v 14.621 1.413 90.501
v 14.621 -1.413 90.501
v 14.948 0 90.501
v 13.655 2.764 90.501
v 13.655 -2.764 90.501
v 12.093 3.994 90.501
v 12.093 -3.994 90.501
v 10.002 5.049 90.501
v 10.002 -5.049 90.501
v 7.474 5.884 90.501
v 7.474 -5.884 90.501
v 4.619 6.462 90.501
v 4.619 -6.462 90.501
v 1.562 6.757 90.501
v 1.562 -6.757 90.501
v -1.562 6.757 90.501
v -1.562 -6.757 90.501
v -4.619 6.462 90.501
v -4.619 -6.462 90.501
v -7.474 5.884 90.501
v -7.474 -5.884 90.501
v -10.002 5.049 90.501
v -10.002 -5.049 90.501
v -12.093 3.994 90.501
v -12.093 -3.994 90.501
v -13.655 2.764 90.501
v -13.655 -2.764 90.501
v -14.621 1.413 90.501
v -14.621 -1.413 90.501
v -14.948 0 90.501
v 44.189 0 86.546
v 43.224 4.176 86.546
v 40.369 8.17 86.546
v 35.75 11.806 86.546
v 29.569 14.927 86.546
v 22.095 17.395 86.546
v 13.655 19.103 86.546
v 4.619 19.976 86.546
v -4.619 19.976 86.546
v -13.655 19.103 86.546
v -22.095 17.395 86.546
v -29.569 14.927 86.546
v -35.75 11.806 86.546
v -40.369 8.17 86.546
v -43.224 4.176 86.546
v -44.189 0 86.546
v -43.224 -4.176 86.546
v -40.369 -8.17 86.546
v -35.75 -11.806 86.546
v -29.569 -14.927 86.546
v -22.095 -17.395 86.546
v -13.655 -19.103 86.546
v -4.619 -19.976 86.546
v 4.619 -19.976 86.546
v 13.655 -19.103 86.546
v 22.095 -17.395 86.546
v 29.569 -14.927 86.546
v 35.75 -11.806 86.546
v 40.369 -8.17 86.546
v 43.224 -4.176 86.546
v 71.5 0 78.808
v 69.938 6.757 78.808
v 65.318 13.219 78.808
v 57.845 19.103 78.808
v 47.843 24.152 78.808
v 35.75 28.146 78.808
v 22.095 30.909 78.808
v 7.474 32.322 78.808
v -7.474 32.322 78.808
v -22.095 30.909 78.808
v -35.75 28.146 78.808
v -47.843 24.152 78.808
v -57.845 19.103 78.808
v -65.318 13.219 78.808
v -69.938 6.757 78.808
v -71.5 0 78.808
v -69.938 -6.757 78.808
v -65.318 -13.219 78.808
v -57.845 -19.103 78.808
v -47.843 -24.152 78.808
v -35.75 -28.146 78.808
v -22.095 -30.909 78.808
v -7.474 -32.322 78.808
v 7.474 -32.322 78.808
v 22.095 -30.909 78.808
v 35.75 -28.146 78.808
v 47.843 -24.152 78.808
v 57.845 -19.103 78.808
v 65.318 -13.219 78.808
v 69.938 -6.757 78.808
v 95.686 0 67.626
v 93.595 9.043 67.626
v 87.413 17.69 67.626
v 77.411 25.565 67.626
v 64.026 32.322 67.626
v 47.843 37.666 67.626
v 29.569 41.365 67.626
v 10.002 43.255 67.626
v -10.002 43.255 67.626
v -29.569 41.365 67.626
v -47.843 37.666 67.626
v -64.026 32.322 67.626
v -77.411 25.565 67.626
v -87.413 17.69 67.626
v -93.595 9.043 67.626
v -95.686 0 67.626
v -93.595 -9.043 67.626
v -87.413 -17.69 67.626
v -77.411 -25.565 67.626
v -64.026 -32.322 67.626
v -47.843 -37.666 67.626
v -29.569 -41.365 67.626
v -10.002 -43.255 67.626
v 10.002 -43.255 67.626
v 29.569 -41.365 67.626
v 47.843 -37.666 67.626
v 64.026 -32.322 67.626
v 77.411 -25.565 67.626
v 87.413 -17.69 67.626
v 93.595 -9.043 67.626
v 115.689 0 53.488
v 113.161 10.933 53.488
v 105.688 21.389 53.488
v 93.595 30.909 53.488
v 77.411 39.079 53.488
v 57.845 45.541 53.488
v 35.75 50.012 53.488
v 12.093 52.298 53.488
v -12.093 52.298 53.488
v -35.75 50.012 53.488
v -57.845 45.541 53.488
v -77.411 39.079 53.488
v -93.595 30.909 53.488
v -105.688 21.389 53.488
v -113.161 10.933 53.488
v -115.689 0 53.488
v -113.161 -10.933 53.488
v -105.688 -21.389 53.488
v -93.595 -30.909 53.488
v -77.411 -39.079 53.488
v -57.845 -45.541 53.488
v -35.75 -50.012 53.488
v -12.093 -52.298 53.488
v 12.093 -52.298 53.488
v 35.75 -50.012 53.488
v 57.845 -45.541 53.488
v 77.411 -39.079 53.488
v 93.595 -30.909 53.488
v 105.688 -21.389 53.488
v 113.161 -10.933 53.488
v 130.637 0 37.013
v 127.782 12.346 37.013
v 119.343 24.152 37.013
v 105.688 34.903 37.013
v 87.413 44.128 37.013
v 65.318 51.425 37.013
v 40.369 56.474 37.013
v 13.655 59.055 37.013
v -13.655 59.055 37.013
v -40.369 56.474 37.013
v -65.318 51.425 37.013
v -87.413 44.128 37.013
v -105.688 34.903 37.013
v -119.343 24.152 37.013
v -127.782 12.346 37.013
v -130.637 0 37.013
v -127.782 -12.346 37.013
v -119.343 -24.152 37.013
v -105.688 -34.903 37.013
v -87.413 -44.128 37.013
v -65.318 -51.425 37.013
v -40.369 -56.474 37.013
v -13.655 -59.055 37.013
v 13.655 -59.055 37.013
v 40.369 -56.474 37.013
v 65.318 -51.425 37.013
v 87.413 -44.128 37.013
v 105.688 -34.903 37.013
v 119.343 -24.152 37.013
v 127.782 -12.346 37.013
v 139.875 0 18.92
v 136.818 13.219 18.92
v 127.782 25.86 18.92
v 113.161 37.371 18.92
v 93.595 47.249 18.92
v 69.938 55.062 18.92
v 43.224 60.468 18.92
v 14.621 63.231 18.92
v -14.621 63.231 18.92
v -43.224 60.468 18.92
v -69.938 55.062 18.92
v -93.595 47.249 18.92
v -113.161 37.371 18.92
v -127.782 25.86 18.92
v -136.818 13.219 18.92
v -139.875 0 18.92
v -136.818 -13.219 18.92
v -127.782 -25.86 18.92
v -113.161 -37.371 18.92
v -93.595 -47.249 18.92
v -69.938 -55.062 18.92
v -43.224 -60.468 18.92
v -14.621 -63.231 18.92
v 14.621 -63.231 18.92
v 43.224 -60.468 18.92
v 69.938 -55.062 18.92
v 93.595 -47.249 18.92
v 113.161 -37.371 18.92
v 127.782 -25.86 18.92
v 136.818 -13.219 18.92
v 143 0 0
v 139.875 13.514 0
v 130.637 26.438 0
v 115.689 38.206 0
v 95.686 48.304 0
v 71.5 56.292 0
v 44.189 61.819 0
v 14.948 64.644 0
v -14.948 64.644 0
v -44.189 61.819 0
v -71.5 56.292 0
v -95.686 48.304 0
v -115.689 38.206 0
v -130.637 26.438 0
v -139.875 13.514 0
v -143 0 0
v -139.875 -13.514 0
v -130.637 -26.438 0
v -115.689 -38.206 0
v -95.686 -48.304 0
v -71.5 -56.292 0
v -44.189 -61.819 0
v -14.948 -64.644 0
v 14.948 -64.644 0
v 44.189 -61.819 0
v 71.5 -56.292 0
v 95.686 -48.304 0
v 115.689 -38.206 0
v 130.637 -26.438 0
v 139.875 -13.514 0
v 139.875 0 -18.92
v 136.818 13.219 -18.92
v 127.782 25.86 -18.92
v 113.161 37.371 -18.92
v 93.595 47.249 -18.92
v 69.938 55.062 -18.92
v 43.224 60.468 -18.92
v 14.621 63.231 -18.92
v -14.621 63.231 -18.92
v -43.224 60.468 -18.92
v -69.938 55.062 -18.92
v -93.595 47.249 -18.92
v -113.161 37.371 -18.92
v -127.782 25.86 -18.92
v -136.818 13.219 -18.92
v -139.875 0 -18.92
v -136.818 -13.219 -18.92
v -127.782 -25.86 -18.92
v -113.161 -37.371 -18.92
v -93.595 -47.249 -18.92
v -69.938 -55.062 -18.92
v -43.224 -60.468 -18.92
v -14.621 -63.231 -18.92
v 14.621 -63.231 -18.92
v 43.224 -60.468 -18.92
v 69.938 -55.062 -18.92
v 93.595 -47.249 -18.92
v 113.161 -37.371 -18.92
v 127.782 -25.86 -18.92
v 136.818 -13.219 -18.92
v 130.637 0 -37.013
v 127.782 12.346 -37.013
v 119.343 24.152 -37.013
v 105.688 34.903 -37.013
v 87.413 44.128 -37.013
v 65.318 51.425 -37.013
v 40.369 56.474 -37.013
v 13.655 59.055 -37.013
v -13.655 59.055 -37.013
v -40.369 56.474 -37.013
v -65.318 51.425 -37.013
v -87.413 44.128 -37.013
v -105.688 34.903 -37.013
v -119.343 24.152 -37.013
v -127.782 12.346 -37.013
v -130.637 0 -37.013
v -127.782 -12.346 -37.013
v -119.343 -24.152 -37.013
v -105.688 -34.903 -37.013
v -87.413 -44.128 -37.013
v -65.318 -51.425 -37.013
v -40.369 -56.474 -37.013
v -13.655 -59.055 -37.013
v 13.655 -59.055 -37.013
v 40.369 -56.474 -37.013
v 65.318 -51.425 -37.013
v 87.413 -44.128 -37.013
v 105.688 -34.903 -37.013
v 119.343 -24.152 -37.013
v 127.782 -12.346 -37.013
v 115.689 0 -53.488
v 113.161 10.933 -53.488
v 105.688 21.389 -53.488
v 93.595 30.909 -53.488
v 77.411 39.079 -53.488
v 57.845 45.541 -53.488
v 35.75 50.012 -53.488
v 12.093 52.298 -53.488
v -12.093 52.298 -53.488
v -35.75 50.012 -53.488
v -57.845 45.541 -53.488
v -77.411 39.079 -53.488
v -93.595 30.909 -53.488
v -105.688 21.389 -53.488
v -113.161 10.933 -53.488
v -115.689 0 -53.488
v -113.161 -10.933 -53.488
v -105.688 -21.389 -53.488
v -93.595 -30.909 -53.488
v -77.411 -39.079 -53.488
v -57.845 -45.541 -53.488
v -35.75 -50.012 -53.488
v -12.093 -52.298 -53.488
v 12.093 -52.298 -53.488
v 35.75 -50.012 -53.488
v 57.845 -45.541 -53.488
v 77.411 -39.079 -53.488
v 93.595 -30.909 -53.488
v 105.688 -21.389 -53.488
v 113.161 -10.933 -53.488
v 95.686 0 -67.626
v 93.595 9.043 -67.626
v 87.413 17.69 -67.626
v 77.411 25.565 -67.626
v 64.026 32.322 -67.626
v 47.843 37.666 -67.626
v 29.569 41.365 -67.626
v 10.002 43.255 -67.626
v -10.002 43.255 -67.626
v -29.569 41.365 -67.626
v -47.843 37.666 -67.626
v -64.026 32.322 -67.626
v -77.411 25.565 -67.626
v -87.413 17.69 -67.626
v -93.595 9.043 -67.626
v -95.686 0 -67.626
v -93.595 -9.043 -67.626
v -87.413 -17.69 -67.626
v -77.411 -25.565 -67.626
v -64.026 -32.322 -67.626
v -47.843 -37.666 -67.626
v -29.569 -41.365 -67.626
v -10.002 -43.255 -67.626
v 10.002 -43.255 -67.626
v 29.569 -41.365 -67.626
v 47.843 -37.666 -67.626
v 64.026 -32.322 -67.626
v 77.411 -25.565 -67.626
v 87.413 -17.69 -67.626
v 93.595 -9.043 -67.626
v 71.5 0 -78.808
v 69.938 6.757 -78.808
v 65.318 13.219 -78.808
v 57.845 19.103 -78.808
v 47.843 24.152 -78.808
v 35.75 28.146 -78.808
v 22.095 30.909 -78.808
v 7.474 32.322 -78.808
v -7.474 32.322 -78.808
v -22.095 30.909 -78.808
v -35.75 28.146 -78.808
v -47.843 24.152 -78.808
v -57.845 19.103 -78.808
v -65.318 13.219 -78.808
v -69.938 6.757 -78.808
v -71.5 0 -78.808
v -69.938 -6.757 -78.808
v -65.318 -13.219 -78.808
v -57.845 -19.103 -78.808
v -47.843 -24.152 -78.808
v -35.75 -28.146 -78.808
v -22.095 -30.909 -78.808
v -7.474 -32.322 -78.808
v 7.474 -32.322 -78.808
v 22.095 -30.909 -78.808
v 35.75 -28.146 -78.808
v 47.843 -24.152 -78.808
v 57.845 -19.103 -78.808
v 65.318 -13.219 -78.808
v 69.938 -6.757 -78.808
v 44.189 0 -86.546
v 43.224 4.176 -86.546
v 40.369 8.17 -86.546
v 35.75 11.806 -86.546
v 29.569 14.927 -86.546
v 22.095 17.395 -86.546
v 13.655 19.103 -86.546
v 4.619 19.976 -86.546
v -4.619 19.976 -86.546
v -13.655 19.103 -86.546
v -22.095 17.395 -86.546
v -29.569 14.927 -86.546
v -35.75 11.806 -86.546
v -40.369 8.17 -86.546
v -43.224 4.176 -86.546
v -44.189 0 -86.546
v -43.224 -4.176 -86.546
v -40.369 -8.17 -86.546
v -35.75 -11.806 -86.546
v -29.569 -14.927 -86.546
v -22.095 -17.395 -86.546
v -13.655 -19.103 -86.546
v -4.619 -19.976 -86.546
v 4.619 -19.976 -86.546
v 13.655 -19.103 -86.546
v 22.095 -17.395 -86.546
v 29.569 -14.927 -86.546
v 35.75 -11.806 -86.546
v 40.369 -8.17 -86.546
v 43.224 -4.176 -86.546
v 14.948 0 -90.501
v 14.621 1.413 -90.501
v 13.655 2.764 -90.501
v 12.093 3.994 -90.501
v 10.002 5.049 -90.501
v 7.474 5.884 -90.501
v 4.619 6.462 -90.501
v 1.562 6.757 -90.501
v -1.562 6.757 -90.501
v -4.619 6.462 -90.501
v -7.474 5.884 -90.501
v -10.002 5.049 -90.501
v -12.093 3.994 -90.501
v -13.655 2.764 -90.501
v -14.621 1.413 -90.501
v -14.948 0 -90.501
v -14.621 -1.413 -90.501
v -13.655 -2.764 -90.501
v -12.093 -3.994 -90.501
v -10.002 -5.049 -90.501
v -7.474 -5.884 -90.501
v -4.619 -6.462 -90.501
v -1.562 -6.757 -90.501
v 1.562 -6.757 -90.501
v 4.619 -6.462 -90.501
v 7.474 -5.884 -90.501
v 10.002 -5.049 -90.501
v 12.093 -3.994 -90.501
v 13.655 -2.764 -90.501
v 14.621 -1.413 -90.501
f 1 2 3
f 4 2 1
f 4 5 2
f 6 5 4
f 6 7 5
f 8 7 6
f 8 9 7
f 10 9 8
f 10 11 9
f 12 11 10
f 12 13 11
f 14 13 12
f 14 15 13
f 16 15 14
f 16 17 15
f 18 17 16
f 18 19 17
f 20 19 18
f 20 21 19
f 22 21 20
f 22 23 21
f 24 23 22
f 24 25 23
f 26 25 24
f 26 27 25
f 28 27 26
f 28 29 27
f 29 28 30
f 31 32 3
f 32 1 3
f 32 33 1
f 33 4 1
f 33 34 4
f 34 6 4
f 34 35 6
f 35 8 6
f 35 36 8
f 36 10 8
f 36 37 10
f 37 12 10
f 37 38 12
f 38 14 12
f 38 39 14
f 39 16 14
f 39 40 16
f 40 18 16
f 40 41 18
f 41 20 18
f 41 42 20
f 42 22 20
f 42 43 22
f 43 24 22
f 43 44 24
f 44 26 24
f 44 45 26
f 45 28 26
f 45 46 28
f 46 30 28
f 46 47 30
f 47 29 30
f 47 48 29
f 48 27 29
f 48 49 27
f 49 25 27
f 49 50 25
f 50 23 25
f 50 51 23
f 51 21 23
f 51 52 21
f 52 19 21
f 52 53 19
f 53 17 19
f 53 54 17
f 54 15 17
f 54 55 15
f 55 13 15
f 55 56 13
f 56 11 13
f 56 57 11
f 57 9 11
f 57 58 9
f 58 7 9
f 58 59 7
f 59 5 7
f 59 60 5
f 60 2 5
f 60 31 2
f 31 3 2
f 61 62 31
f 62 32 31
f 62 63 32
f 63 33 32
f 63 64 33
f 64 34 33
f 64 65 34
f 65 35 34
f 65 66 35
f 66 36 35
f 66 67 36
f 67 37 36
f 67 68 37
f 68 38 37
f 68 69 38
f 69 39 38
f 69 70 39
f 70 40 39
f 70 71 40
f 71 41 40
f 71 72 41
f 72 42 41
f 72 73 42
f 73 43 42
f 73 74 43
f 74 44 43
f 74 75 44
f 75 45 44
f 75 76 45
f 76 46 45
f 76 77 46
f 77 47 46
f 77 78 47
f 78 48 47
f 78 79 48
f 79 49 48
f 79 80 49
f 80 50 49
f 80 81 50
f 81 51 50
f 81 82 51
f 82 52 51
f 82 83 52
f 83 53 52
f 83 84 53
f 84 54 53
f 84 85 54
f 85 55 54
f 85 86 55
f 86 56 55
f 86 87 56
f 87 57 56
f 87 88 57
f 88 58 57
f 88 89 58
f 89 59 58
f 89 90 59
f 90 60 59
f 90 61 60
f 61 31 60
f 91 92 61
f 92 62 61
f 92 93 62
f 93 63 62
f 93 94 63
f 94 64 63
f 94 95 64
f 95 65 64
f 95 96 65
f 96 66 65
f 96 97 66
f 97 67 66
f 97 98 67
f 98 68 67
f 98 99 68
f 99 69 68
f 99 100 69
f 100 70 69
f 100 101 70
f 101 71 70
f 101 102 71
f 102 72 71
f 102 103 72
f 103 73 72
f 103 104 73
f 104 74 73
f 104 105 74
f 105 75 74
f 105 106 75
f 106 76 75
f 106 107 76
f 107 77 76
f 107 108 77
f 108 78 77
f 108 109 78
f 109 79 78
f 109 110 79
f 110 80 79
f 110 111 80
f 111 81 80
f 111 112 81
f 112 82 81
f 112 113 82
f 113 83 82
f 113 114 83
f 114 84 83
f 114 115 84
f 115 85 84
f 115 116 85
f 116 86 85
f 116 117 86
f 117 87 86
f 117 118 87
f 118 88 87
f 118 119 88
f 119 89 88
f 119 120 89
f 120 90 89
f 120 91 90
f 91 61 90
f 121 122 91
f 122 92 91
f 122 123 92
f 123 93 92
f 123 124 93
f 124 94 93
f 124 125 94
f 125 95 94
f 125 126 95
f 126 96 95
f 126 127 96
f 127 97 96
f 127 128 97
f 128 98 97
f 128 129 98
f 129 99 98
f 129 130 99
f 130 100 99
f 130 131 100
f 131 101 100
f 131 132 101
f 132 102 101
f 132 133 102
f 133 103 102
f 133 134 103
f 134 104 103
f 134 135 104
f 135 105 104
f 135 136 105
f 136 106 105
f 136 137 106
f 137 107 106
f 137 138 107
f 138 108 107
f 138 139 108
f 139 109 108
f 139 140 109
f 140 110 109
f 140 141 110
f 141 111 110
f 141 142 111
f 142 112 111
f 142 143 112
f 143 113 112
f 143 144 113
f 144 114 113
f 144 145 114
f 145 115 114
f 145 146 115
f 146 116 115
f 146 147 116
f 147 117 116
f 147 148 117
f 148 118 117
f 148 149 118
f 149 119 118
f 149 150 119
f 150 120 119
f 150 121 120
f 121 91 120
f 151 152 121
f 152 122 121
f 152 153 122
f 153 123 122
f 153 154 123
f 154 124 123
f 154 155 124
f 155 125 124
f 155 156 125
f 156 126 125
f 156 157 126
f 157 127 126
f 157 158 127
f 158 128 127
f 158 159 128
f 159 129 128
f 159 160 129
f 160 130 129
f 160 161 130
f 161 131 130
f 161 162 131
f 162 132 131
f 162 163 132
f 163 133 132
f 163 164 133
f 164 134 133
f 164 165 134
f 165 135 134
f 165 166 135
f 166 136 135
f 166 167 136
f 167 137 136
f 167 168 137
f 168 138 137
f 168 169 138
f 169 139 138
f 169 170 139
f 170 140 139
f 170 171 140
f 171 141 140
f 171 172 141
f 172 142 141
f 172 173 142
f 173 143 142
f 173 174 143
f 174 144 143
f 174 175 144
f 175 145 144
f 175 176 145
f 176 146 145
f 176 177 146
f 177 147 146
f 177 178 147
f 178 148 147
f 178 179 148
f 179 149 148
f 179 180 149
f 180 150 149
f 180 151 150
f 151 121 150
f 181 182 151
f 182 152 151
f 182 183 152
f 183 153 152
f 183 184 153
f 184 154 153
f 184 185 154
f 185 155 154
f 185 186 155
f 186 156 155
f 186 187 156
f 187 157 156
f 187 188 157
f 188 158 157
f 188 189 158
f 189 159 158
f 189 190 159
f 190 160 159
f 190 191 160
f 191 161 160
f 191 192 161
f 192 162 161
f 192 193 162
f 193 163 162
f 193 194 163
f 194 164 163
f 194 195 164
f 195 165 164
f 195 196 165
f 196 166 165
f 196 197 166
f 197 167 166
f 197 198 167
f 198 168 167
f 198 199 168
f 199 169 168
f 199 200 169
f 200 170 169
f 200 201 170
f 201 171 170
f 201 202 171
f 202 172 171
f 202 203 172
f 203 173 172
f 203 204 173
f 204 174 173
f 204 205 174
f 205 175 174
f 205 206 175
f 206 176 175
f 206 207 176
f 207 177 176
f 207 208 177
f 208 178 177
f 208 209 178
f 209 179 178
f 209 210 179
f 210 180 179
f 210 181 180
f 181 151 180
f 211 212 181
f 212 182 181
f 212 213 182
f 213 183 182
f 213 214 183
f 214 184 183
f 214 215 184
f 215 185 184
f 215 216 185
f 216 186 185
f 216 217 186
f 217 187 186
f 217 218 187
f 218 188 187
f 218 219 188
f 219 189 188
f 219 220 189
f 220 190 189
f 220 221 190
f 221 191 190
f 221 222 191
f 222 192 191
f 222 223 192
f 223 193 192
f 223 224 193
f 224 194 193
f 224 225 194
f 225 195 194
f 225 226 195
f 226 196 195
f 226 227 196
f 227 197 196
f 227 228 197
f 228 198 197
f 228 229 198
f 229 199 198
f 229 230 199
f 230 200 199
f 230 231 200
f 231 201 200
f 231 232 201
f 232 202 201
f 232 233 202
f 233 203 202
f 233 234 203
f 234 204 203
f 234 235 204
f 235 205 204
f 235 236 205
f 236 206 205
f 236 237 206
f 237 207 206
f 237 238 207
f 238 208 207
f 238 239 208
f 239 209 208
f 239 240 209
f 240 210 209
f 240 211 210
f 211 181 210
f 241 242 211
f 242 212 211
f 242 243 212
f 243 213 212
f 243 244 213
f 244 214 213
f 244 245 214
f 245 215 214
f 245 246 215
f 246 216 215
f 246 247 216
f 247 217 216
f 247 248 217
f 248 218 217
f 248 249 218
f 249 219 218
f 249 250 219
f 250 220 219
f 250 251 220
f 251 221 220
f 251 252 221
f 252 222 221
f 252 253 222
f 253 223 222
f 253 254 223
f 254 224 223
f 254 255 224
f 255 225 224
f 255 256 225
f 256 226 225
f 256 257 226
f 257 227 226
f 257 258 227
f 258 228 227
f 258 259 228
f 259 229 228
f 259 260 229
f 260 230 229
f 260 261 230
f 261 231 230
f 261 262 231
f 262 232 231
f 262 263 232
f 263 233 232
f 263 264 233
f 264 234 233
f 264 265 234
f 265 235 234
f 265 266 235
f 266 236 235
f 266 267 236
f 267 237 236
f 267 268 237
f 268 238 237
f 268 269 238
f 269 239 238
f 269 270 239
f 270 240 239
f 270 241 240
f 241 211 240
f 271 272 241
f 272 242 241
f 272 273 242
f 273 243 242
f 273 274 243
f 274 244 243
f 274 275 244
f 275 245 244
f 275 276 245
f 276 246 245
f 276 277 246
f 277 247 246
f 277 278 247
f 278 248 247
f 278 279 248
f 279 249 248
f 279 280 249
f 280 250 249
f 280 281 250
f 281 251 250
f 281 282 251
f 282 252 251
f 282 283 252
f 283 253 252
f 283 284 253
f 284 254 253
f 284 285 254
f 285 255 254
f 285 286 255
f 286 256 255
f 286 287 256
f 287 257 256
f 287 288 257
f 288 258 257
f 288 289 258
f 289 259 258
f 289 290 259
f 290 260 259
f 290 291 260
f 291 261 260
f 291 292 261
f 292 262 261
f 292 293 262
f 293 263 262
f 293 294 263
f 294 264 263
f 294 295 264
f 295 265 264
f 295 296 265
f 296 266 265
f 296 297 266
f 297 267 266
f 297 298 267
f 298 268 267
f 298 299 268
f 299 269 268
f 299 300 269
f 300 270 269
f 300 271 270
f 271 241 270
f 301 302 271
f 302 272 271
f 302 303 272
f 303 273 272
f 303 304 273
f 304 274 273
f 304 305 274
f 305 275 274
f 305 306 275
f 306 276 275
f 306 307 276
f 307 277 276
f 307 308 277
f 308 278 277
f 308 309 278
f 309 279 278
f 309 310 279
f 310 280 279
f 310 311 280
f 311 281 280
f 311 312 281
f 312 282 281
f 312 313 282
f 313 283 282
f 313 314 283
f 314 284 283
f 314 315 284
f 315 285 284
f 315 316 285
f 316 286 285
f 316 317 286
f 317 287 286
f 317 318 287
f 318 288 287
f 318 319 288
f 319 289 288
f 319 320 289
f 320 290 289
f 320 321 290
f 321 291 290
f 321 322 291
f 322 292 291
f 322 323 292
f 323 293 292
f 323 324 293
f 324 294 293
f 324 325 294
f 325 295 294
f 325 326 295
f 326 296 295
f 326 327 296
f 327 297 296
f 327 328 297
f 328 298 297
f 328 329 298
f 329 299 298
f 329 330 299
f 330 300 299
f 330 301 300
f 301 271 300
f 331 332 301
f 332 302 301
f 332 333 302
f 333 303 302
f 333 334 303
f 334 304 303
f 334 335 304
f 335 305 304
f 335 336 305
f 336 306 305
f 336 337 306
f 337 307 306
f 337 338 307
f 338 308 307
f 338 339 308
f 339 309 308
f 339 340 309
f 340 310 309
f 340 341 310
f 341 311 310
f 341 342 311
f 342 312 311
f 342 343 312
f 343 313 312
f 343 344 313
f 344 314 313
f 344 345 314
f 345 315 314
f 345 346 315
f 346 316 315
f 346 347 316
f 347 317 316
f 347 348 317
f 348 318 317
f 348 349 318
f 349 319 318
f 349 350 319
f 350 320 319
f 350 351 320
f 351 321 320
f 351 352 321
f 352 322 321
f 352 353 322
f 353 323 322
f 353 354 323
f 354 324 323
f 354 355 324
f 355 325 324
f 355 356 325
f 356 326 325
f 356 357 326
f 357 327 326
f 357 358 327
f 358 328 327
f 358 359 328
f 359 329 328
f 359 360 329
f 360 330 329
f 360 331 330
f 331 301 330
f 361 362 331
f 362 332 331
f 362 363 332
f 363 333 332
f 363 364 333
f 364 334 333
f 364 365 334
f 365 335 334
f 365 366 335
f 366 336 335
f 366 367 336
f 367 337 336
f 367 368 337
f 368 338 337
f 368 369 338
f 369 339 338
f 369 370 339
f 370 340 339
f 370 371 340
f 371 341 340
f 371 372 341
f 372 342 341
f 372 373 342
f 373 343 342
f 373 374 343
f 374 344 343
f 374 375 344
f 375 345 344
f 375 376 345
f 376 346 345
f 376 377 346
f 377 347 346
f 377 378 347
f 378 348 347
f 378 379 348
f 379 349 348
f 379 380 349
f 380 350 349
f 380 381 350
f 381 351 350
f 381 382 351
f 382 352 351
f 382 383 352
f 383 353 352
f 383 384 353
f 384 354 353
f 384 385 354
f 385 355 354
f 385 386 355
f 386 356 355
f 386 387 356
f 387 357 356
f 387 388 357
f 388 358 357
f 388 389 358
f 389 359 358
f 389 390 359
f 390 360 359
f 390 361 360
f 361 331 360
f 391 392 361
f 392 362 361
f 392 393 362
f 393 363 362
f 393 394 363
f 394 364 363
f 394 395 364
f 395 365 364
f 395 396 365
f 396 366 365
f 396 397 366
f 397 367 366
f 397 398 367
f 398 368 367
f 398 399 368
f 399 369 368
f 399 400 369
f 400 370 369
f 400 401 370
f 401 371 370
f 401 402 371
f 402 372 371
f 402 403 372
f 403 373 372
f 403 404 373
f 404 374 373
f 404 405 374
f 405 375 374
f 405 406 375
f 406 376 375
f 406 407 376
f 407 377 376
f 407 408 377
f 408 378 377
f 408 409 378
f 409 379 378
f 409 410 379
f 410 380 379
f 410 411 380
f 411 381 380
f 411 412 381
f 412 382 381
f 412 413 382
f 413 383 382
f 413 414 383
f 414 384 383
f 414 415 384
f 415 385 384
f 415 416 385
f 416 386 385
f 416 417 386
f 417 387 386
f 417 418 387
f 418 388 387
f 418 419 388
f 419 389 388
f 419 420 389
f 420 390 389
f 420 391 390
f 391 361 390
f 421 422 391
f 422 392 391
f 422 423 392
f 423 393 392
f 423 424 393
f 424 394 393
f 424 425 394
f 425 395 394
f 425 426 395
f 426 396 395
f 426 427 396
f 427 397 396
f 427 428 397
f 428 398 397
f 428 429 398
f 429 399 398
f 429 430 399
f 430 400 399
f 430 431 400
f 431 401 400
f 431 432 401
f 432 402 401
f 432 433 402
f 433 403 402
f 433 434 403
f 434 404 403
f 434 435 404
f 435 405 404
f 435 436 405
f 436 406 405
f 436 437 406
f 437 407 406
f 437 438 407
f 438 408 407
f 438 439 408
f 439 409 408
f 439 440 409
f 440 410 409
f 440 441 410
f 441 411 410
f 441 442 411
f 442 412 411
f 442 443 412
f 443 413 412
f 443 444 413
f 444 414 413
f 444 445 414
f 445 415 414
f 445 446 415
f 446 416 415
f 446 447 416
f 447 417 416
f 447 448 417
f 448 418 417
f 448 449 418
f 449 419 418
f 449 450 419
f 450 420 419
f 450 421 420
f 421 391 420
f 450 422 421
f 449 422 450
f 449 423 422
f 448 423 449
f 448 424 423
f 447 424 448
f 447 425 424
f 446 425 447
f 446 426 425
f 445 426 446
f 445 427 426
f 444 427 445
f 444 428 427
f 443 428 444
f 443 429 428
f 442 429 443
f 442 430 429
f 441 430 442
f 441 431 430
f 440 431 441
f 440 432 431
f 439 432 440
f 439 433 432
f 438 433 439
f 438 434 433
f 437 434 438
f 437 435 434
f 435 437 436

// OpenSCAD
// Generated by SolidPython 1.0.1 on 2020-07-29 00:46:49


scale(v = [11, 5, 7]) {
	sphere(r = 13);
}
/***********************************************
*********      SolidPython code:      **********
************************************************
 
# import packages: SolidPython
from solid import *
from solid.utils import *
from itertools import chain, combinations, permutations


class Resize:

    def __init__(self, scad_file):
        self.scad_file = scad_file
        #self.scad_file = import_scad(scad_file)
        # cone/cylinder param:
        self.r1 = 0
        self.r2 = 0
        self.h = 0
        # rectangular prism param:
        self.w = 0
        self.l = 0
        # ellipse param:
        self.r = 0

    # import OpenScad code (file name corresponds to shape)


    # classify shape + parameters
    def assign(self, param1, param2, param3):
        if self.scad_file == 'cone.scad':
            self.r1 = param1
            self.r2 = param2
            self.h = param3
        elif self.scad_file == 'cylinder.scad':
            self.r1 = param1
            self.r2 = param2
            self.h = param3
        elif self.scad_file == 'rectangularPrism.scad':
            self.h = param1
            self.l = param2
            self.w = param3
        else:
            self.r = param1
            self.h = param2

    # resize parameters
    def iterate(self):
        x = range(3, 20, 2)
        i = 1
        if self.scad_file == 'cone.scad':
            tempList = list(permutations(x, 2))
            for temp in tempList:
                param1 = temp[0]
                param2 = temp[1]
                filepath = 'produced_scad_files/' + 'cone' + str(param1) + '_' + str(param2) + '_' + '.scad'
                scad_render_to_file(cylinder(h=param1, r1=param2, r2=0), filepath)

        elif self.scad_file == 'cylinder.scad':
            tempList = list(permutations(x, 3))
            for temp in tempList:
                param1 = temp[0]
                param2 = temp[1]
                filepath = 'produced_scad_files/' + 'cylinder' + str(param1) + '_' + str(param2) + '_' + '.scad'
                scad_render_to_file(cylinder(h=param1, r1=param2, r2=param2), filepath)

        elif self.scad_file == 'rectangularPrism.scad':
            tempList = list(permutations(x, 3))
            for temp in tempList:
                param1 = temp[0]
                param2 = temp[1]
                param3 = temp[2]
                filepath = 'produced_scad_files/' + 'rectangularPrism' + str(param1) + '_' + str(param2) + '_' + str(
                    param3) + '.scad'
                scad_render_to_file(cube(size=(param1, param2, param3)), filepath)

        elif self.scad_file == 'ellipse.scad':
            tempList = list(permutations(x, 4))
            for temp in tempList:
                param1 = temp[0]
                param2 = temp[1]
                param3 = temp[2]
                param4 = temp[3]
                filepath = 'produced_scad_files/' + 'ellipse' + str(param1) + '_' + str(param2) + '_' + str(param3) + '_' + str(param4) + '.scad'
                scad_render_to_file(scale([param1, param2, param3])(sphere(r=param4)), filepath)

    def render_to_scadfile(self):
        scad_render_to_file(scad, 'example.scad') 
 
************************************************/
